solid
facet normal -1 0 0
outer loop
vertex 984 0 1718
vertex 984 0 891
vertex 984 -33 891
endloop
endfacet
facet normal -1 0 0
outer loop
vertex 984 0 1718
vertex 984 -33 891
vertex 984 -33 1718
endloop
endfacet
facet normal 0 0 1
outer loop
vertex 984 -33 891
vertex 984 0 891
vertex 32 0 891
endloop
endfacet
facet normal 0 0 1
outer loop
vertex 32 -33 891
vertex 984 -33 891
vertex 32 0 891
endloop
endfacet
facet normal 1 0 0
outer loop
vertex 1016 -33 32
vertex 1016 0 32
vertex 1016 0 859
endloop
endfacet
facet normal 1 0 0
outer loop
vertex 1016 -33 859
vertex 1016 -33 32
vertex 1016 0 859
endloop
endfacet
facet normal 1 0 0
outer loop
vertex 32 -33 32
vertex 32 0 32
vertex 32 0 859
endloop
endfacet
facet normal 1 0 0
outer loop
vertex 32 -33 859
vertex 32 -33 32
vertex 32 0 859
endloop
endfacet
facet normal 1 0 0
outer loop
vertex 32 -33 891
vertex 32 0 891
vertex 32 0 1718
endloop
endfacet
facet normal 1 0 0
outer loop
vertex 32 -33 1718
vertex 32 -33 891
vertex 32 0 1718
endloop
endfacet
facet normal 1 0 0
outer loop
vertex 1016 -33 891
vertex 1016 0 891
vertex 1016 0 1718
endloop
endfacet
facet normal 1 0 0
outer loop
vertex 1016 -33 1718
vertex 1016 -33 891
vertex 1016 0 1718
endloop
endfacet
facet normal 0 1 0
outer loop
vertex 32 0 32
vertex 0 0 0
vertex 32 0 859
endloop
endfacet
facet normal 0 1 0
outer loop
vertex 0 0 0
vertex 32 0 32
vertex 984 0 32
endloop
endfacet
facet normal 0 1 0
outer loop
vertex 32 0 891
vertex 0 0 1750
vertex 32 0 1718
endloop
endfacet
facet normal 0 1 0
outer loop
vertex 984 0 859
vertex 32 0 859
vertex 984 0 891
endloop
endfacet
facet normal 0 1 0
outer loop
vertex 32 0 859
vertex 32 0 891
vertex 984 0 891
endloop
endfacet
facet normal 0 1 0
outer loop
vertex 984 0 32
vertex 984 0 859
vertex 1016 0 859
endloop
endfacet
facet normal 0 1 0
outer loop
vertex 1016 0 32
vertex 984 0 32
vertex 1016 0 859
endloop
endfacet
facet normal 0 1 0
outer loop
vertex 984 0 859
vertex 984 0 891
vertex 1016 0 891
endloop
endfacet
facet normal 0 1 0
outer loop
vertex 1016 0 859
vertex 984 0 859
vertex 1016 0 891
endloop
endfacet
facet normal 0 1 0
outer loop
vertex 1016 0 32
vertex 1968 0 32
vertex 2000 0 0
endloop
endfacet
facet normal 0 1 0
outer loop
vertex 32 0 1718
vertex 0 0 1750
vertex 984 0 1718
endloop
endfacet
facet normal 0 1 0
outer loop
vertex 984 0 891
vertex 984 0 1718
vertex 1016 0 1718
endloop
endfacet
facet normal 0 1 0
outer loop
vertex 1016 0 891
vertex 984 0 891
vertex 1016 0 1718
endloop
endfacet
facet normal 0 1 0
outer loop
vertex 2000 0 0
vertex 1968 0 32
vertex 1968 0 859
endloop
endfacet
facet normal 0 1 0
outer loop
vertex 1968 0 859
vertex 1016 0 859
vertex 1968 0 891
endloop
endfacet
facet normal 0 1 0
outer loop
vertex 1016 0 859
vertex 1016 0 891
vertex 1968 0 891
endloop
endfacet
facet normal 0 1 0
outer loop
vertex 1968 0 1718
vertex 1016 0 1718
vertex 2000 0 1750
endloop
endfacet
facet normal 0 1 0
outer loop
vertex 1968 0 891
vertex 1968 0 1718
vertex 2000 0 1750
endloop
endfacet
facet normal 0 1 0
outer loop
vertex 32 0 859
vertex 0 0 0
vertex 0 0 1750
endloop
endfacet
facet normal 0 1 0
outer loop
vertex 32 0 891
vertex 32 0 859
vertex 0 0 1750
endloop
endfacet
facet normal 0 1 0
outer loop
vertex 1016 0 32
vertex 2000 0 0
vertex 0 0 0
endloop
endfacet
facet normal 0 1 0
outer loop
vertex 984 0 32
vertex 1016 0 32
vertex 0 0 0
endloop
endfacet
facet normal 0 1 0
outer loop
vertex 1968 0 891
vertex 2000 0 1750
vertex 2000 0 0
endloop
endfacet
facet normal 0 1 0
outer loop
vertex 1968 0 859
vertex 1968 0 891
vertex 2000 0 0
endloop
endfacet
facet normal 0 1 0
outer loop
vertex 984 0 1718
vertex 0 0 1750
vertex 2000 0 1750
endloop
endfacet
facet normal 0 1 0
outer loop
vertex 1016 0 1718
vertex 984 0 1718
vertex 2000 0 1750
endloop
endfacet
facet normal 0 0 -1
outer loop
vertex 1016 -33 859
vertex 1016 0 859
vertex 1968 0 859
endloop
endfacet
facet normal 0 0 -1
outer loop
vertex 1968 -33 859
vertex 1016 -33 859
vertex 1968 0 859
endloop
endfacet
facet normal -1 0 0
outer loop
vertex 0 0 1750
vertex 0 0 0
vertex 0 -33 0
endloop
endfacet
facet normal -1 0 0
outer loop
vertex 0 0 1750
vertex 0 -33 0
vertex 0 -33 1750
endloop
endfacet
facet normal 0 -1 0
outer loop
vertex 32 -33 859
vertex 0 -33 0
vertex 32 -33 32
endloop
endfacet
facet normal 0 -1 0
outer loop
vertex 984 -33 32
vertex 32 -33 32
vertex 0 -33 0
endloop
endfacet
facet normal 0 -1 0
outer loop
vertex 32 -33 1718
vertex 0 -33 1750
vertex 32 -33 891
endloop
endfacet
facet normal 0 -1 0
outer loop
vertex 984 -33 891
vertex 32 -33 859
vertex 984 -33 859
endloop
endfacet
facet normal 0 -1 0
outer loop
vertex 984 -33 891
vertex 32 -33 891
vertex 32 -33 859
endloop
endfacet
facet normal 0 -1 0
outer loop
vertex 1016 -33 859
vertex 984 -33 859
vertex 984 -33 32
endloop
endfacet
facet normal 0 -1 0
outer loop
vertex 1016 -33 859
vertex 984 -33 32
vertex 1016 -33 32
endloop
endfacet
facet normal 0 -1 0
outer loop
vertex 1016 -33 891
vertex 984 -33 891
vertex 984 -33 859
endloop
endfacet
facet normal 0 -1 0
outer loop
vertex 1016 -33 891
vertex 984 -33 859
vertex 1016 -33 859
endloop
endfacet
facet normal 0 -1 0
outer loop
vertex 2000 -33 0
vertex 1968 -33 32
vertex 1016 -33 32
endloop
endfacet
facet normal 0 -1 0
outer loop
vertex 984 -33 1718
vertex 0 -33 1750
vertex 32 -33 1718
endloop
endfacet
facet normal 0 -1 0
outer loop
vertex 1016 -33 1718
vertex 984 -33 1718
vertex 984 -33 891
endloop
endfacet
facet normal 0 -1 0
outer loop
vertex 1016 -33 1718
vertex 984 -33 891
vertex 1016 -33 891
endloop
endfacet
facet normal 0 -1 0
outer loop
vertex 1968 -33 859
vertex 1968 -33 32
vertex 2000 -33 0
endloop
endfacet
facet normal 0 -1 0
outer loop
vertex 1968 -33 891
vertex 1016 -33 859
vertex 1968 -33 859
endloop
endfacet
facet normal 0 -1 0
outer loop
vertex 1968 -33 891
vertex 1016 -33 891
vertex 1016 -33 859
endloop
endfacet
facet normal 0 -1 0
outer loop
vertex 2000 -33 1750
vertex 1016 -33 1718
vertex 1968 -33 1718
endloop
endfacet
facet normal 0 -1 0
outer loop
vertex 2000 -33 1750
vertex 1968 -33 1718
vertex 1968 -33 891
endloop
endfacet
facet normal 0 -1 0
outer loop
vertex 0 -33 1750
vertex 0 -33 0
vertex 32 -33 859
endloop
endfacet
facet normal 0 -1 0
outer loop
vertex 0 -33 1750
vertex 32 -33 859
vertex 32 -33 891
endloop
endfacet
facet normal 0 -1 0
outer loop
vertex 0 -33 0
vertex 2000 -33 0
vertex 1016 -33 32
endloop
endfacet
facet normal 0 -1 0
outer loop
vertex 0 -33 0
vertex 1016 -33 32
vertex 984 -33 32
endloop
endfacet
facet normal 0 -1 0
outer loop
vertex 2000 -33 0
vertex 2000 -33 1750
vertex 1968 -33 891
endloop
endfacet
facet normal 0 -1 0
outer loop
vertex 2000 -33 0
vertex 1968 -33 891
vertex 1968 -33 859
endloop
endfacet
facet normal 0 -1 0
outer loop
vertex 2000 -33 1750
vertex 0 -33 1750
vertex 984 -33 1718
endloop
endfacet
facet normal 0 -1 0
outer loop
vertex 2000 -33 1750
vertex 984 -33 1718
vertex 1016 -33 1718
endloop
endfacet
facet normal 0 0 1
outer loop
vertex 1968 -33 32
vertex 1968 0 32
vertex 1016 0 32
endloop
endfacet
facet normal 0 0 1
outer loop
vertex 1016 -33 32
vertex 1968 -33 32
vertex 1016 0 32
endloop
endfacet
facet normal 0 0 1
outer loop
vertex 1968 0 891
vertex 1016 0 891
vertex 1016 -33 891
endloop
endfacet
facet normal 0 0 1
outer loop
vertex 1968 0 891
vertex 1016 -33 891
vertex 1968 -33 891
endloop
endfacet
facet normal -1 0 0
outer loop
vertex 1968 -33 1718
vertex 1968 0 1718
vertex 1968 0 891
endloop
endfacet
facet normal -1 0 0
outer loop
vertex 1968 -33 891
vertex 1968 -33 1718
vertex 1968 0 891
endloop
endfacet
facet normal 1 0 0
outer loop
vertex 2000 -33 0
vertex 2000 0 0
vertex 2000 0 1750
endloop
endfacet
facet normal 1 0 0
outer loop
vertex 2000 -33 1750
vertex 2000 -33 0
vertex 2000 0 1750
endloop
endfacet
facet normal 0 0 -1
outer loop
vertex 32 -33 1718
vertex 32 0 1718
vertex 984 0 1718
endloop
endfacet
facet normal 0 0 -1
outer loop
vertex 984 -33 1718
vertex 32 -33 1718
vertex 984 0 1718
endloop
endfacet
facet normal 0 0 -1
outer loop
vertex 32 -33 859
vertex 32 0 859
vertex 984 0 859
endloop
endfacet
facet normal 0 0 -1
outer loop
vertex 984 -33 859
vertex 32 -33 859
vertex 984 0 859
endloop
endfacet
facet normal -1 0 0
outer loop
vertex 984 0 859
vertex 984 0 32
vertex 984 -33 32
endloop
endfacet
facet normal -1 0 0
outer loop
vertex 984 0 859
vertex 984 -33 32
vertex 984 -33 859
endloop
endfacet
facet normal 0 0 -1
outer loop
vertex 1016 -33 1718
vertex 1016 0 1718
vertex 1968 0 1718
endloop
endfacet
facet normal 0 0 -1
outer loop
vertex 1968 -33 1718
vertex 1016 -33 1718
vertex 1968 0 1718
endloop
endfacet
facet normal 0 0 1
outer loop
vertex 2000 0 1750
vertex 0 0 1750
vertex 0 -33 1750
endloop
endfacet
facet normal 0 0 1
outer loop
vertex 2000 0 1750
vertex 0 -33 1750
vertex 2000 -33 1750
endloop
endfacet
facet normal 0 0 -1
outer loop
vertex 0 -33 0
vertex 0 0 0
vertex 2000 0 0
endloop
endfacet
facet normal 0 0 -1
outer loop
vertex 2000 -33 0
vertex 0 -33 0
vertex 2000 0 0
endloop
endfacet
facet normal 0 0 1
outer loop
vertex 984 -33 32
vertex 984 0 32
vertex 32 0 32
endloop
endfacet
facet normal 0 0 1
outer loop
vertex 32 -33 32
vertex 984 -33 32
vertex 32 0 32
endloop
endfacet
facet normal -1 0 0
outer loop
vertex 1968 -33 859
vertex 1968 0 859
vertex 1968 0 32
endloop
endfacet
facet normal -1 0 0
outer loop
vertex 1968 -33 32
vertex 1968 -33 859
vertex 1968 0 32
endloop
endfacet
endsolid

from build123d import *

# Parameters (mm, degrees)
F0_W     = 2000
F0_H     = 1750
F0_W_2   = 952
F0_H_2   = 32
F0_W_3   = 32
F0_H_3   = 827
F1_DEPTH = 33


with BuildPart() as f1:
    # F0 (on Front) → F1 (new body)
    with BuildSketch(Plane.XZ):
        with Locations((1000, 875)):
            Rectangle(F0_W, F0_H)
        Polygon((984, 32), (32, 32), (32, 859), (32, 891), (32, 1718), (984, 1718), (1016, 1718), (1968, 1718), (1968, 891), (1968, 859), (1968, 32), (1016, 32), align=None, mode=Mode.SUBTRACT)
        with Locations((508, 875)):
            Rectangle(F0_W_2, F0_H_2)
        with Locations((1000, 445.5)):
            Rectangle(F0_W_3, F0_H_3)
        with Locations((1000, 875)):
            Rectangle(F0_W_3, F0_H_2)
        with Locations((1000, 1304.5)):
            Rectangle(F0_W_3, F0_H_3)
        with Locations((1492, 875)):
            Rectangle(F0_W_2, F0_H_2)
    extrude(amount=F1_DEPTH)


solid = f1.part
